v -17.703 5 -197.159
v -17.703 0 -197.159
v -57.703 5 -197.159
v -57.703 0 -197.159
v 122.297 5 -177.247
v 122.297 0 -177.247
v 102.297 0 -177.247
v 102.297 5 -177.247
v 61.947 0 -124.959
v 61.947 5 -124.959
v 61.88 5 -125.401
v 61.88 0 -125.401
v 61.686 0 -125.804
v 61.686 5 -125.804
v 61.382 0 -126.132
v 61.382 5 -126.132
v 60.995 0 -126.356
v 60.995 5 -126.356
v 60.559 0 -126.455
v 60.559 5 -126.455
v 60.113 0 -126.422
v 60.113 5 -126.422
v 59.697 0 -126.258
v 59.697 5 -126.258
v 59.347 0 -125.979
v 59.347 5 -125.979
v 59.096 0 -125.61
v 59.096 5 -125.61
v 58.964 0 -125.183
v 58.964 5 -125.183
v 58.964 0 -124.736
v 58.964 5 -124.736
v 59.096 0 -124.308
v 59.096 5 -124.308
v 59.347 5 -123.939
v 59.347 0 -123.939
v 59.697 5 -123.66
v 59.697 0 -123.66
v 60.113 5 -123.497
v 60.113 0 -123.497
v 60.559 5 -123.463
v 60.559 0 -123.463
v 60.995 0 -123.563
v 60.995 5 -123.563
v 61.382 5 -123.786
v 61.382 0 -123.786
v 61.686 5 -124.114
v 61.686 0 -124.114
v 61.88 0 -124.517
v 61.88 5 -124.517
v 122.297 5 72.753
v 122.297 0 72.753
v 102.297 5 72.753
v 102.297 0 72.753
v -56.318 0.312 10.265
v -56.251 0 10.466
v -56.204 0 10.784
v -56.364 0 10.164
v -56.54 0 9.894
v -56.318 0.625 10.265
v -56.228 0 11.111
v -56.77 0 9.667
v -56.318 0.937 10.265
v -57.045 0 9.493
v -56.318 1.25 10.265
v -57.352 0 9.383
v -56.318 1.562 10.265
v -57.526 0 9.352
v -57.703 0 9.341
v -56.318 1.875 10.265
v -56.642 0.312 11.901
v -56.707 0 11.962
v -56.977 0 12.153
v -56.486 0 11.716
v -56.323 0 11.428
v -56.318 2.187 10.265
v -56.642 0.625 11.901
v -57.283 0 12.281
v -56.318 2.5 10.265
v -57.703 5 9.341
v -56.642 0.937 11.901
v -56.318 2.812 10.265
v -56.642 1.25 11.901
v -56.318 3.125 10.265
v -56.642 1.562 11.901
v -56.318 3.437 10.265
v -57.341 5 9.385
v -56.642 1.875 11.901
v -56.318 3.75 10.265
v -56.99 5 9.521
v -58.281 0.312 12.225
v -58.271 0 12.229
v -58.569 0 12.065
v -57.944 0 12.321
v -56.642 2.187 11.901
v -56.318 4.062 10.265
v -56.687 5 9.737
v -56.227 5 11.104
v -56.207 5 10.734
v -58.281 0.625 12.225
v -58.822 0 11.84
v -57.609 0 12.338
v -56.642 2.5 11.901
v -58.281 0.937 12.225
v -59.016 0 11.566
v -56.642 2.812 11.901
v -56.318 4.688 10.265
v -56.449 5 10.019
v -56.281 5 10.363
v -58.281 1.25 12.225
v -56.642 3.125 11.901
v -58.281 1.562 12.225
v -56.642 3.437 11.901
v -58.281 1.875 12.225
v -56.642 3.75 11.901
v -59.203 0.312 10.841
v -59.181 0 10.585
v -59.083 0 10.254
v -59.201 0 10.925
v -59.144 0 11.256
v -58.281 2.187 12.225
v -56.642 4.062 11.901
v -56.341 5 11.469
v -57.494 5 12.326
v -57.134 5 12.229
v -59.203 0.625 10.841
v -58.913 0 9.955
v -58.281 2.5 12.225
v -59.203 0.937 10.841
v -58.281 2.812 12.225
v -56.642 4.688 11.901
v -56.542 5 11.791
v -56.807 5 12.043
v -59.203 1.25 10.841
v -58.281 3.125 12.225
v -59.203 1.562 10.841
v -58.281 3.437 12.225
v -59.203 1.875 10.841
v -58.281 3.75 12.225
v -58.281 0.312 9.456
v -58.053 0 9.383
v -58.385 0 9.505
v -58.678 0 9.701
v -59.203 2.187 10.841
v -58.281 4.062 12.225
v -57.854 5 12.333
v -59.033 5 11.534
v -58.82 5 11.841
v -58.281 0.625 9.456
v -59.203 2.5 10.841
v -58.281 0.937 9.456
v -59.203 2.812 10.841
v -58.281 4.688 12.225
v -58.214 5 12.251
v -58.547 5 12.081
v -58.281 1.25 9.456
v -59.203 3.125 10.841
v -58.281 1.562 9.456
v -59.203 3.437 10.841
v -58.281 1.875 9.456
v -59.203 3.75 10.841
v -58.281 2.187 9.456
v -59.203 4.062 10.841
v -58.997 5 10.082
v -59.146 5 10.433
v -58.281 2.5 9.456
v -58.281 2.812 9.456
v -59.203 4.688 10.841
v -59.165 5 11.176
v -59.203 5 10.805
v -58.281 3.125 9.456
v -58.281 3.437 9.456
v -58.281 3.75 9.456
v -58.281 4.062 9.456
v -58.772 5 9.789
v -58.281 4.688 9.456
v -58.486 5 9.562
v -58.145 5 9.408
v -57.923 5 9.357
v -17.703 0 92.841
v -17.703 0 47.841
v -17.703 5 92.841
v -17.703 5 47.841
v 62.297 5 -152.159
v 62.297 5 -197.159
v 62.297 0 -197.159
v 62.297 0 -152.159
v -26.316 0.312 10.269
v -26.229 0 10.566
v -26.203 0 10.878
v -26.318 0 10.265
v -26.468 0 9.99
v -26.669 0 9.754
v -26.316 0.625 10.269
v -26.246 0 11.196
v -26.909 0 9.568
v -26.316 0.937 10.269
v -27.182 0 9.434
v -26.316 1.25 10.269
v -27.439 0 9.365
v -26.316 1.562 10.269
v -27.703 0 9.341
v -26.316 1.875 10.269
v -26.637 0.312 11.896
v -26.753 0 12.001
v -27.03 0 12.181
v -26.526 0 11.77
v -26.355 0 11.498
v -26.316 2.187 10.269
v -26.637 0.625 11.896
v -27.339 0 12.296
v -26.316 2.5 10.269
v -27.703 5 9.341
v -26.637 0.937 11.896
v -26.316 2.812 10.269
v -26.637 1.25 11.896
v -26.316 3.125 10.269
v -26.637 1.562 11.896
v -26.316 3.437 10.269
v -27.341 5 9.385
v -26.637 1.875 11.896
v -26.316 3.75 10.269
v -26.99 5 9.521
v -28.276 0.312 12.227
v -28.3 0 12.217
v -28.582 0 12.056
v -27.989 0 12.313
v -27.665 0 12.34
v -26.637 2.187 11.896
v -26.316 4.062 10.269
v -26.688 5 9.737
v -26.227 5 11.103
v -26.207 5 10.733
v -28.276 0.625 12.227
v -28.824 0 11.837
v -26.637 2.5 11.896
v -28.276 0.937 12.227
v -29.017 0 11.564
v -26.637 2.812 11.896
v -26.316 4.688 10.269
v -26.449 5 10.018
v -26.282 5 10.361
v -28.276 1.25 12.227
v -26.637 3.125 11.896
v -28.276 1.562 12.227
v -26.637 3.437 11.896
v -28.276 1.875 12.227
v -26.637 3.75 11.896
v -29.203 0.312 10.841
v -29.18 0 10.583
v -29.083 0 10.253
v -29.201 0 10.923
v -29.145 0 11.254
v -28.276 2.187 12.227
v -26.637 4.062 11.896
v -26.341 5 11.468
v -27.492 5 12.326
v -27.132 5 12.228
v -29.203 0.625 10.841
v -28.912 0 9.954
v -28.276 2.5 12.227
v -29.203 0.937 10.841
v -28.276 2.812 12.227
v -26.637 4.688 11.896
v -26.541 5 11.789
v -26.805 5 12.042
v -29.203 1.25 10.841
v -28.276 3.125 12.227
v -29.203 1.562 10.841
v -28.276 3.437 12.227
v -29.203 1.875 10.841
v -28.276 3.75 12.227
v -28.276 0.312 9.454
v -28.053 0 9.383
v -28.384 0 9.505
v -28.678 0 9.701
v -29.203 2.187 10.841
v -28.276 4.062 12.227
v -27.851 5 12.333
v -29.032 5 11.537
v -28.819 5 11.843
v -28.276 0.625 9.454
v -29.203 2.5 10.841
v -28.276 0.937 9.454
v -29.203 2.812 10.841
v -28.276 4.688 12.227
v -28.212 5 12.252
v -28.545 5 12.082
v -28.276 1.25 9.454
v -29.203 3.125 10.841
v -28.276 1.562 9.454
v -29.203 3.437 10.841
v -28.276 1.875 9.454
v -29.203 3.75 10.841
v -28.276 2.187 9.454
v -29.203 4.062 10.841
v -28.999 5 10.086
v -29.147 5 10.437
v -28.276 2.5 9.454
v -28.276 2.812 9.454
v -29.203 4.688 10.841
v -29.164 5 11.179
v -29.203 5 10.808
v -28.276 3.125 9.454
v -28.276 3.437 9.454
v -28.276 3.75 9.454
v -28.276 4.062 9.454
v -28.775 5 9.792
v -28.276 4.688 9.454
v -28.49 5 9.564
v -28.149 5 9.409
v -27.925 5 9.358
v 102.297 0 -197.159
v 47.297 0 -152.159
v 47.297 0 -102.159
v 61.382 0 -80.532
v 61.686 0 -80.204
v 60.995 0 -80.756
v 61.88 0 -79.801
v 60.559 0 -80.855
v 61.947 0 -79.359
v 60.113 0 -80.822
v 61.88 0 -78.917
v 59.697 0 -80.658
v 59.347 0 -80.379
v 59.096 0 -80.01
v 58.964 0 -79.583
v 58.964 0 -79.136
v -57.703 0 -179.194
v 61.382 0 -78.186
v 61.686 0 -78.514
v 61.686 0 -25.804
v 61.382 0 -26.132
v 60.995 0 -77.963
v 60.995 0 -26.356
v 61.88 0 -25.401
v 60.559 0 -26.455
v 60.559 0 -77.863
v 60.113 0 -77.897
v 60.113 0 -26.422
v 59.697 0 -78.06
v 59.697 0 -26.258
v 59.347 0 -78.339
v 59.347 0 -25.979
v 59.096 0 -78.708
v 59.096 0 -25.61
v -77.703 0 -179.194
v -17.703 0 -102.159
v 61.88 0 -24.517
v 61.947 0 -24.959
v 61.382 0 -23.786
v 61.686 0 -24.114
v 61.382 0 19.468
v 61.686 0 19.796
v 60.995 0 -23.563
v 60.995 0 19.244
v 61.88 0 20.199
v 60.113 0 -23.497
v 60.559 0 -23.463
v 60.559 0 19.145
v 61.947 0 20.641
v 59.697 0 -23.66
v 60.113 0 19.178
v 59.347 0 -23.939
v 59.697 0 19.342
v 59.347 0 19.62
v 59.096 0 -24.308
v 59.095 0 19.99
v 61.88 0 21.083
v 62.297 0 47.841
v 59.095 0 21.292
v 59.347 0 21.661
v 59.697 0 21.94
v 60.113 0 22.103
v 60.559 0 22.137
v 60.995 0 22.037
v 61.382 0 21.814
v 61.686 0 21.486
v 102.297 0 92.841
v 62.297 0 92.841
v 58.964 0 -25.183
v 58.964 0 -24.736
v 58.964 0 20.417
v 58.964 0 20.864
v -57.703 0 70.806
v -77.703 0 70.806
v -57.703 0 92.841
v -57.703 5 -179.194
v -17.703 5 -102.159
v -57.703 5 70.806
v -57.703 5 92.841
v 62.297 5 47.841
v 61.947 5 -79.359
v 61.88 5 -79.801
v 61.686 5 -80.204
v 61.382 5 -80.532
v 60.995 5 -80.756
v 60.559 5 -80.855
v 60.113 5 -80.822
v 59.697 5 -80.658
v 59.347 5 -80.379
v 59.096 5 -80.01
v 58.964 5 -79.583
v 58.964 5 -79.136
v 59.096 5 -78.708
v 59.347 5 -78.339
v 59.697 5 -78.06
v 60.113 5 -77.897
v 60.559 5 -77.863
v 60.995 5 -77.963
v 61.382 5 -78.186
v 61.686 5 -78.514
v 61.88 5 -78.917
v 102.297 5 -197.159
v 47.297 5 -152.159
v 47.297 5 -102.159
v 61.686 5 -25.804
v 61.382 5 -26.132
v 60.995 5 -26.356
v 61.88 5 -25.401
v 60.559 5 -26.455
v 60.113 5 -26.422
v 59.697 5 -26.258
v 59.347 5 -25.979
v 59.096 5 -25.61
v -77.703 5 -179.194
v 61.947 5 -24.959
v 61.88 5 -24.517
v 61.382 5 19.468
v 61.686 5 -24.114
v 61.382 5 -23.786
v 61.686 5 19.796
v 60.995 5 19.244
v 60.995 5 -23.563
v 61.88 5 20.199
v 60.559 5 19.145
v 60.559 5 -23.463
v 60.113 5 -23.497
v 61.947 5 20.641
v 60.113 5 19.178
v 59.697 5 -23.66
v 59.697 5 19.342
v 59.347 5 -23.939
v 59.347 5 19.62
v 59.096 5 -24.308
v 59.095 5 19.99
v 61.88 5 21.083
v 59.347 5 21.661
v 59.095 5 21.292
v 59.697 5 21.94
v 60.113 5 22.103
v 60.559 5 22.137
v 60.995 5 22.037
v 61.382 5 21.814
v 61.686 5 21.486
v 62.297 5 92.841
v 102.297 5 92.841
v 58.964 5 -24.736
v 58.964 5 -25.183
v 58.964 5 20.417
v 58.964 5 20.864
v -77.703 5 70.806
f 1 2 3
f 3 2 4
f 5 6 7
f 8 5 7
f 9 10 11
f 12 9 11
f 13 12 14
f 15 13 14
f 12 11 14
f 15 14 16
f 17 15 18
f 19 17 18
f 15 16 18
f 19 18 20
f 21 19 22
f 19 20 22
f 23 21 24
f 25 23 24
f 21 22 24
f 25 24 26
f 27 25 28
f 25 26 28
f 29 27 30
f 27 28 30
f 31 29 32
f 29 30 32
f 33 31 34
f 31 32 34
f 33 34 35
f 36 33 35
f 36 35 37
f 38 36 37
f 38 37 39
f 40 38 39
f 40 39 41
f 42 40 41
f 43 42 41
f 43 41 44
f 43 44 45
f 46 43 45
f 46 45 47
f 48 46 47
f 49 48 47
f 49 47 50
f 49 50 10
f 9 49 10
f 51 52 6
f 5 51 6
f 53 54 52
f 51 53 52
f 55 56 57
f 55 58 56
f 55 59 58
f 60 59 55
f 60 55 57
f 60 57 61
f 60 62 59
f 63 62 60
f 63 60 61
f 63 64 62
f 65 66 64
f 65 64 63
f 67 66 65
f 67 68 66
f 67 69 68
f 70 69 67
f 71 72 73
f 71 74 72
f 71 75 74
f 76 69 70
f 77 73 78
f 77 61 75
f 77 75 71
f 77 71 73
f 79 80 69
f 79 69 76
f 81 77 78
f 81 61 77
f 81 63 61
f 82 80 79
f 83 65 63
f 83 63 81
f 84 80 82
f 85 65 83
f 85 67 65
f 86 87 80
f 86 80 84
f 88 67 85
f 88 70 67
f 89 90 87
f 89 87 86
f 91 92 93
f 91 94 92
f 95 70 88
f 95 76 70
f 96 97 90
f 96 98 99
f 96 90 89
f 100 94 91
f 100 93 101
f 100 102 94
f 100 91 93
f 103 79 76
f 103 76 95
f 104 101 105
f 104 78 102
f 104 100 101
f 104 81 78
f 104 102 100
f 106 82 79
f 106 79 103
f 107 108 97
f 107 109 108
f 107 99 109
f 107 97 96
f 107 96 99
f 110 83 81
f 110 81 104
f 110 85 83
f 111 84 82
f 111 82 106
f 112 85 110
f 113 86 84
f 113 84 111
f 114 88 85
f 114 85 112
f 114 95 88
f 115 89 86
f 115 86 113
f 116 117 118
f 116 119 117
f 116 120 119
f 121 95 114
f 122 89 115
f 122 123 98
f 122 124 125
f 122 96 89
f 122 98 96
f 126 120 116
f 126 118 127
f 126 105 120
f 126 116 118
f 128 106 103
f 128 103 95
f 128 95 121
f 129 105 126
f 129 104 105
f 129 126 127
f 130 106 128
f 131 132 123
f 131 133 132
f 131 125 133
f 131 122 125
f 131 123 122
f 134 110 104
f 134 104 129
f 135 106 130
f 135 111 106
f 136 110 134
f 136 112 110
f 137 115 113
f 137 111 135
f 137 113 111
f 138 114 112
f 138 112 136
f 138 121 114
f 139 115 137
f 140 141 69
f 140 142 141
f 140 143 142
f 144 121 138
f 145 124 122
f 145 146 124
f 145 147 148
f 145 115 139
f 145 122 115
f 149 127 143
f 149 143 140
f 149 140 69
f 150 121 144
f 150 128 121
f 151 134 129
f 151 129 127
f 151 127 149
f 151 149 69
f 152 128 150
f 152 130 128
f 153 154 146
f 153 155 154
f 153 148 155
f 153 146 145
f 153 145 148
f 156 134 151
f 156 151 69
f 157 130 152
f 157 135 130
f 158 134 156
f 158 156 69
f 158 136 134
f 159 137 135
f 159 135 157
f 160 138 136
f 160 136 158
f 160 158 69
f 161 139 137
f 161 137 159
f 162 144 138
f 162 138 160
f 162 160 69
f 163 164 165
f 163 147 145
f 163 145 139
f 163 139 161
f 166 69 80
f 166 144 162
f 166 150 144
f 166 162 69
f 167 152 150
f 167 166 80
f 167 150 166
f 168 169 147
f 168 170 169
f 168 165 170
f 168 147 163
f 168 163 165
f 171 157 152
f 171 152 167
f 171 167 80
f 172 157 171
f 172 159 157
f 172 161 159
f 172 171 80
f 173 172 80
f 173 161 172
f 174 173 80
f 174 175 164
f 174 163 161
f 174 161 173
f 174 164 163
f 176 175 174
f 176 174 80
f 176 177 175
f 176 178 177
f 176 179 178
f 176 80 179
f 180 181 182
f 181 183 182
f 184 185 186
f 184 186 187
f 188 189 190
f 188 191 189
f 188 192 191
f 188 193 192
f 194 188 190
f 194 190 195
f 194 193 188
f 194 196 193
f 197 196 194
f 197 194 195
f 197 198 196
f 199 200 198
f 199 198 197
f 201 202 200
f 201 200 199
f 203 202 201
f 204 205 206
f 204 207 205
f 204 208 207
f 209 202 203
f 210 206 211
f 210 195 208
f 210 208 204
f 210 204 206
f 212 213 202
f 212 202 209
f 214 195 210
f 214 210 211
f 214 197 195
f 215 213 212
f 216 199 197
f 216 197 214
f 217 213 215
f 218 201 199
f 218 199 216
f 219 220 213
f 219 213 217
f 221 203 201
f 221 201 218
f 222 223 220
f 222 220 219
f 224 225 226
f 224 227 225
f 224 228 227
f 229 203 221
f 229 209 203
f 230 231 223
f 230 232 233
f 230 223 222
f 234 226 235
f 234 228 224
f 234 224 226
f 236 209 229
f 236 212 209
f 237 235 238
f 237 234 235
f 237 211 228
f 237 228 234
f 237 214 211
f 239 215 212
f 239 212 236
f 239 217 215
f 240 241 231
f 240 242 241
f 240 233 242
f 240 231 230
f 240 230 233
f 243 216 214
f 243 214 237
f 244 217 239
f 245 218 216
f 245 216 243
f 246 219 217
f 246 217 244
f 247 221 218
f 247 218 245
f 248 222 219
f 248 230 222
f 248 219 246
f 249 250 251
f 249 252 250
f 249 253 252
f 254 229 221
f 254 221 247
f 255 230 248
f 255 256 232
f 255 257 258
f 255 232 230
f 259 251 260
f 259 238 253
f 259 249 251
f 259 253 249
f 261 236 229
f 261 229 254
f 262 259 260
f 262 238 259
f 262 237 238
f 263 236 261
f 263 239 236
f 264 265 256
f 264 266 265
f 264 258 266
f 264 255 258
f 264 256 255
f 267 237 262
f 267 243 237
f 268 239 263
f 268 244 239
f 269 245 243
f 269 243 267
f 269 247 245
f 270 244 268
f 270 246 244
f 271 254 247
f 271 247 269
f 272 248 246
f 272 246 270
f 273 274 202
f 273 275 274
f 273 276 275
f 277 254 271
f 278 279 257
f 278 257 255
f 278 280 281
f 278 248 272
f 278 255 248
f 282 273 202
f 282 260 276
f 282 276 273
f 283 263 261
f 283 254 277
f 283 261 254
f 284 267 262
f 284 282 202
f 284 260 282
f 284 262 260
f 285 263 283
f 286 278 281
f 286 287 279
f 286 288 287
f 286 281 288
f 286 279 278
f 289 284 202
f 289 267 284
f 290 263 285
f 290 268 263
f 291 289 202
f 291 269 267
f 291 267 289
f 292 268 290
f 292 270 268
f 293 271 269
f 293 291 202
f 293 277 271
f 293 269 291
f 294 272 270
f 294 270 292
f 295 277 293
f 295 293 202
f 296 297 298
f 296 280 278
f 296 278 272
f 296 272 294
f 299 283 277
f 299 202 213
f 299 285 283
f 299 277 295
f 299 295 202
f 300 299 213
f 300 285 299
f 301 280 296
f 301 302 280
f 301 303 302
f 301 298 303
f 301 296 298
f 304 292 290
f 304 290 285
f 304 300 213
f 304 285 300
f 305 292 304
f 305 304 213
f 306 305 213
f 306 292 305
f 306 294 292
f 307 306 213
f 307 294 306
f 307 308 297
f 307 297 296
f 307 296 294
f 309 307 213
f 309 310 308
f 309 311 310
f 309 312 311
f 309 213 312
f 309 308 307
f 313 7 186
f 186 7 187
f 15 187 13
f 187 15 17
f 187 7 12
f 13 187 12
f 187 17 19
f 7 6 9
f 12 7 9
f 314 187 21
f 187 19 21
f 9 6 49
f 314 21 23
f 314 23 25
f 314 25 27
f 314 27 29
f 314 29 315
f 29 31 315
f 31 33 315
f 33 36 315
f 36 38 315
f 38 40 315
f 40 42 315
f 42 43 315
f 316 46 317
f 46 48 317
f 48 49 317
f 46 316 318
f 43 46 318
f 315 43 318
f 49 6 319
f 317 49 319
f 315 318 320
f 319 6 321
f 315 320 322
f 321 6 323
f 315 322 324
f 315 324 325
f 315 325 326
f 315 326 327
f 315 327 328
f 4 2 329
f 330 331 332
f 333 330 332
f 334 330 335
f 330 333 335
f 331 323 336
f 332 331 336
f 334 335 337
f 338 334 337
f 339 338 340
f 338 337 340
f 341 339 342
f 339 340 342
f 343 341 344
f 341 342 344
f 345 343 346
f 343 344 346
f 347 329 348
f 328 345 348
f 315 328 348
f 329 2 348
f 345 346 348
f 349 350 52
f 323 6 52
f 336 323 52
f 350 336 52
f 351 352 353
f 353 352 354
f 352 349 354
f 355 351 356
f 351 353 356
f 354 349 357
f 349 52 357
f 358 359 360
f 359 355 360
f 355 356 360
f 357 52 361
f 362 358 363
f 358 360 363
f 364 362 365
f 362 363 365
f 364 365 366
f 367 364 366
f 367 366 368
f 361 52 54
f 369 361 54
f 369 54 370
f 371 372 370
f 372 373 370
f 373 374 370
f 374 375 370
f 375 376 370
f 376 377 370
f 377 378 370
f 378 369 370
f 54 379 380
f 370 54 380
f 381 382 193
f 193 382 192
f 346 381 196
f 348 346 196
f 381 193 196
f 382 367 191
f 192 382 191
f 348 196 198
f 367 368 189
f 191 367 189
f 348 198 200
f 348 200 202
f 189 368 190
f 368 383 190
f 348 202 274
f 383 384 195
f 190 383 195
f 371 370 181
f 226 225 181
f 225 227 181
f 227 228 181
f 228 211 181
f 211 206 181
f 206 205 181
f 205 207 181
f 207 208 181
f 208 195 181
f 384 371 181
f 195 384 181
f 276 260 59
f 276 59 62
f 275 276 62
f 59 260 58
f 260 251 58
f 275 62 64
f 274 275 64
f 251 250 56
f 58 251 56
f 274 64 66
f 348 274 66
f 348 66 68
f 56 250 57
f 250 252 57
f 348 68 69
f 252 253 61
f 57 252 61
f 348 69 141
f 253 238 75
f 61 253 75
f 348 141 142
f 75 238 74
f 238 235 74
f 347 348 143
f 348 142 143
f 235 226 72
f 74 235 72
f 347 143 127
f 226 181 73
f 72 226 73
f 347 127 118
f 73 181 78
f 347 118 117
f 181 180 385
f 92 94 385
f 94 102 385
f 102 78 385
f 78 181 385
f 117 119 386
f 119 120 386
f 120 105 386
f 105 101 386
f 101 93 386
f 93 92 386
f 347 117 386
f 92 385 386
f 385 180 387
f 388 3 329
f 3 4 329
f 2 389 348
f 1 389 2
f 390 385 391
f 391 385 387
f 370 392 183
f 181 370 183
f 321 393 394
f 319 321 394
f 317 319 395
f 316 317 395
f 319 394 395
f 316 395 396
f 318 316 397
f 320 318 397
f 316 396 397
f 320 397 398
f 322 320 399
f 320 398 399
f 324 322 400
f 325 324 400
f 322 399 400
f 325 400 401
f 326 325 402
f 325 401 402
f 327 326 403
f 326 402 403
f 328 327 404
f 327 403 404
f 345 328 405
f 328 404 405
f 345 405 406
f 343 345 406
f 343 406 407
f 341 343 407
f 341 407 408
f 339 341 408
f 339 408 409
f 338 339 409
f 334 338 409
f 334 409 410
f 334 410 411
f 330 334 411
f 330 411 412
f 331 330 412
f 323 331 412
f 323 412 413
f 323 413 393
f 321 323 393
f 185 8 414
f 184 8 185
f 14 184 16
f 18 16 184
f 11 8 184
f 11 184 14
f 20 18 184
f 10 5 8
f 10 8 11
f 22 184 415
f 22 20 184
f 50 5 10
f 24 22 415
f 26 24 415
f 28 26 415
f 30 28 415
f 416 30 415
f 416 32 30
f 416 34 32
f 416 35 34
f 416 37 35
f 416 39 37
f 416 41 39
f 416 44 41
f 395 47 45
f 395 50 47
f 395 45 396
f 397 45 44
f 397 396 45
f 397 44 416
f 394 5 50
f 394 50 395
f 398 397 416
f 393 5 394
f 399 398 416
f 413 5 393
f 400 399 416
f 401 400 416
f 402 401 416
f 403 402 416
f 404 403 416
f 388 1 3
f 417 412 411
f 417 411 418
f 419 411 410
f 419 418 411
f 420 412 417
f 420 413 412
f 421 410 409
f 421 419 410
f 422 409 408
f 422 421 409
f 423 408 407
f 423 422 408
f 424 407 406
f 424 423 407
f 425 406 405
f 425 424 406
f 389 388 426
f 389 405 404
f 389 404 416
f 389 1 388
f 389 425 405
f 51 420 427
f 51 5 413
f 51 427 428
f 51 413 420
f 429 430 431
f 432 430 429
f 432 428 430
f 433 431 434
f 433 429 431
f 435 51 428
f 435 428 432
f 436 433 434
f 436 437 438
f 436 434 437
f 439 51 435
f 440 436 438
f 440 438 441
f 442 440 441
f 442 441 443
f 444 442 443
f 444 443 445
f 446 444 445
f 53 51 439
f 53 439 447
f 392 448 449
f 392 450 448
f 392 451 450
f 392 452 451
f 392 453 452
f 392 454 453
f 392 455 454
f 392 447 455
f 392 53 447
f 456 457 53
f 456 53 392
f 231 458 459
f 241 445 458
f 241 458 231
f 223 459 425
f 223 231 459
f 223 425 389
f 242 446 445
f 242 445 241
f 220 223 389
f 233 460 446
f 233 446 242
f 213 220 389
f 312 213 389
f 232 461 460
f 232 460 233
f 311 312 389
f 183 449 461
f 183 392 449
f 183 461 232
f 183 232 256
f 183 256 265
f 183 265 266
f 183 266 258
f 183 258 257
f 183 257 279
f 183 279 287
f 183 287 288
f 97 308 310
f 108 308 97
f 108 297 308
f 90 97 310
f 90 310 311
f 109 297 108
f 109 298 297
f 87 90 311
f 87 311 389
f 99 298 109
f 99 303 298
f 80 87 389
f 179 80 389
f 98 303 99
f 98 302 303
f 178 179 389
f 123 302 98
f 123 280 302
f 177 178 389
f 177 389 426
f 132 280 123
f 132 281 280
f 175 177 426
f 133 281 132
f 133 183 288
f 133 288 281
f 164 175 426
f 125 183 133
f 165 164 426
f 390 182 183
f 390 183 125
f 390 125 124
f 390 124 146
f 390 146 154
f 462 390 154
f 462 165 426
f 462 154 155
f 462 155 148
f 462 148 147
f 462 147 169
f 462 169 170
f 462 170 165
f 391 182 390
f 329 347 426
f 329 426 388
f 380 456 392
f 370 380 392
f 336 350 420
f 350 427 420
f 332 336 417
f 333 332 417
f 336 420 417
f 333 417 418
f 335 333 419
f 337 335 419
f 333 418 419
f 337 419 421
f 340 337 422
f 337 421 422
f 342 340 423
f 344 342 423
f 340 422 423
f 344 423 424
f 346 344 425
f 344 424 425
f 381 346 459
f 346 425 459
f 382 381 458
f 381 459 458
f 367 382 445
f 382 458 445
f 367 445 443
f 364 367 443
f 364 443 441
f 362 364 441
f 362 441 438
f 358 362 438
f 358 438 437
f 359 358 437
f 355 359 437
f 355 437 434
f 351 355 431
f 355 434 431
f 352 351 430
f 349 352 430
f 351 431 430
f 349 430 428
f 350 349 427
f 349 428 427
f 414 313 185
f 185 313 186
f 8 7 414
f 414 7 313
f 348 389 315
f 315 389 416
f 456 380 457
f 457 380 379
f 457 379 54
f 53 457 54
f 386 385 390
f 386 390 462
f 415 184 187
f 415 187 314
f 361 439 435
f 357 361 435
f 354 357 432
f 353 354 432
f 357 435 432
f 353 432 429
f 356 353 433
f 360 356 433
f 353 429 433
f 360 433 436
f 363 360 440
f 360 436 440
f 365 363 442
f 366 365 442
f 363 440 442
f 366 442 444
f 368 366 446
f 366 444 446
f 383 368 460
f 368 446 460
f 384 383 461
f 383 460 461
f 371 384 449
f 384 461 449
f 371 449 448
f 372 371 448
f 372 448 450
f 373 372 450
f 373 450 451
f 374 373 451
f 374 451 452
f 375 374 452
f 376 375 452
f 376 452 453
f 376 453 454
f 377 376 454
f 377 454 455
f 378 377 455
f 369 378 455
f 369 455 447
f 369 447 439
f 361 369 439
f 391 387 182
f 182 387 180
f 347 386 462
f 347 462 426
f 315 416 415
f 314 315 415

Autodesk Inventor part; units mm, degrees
ref_plane "YZ Plane" through (0, 0, 0) normal (1, 0, 0) x (0, 1, 0)
ref_plane "XZ Plane" through (0, 0, 0) normal (0, 1, 0) x (-1, 0, 0)
ref_plane "XY Plane" through (0, 0, 0) normal (0, 0, 1) x (1, 0, 0)
sketch "Esquisse1" plane through (0, 0, 0) normal (0, 1, 0) x (-1, 0, 0)
  line L0 (57.703, 92.8408) -> (-102.297, 92.8408)
  line L1 (-102.297, -197.1592) -> (57.703, -197.1592)
  line L2 (-102.297, 72.7532) -> (-122.297, 72.7532)
  line L3 (-122.297, 72.7532) -> (-122.297, -177.2468)
  line L4 (-122.297, -177.2468) -> (-102.297, -177.2468)
  line L5 (-102.297, 70.8056) -> (-102.297, 72.7532)
  line L6 (57.703, 70.8056) -> (77.703, 70.8056)
  line L7 (77.703, 70.8056) -> (77.703, -179.1944)
  line L8 (77.703, -179.1944) -> (57.703, -179.1944)
  line L9 (57.703, -179.1944) -> (57.703, -177.2468)
  line L10 (57.703, -197.1592) -> (57.703, -179.1944)
  line L11 (57.703, 70.8056) -> (57.703, 92.8408)
  line L12 (-102.297, 92.8408) -> (-102.297, 72.7532)
  line L13 (-102.297, -177.2468) -> (-102.297, -197.1592)
  point P0 (0, 0)
  dimension "d0" = 290
  dimension "d1" = 160
  dimension "d17" = 20
  dimension "d18" = 250
  dimension "d19" = 20
  dimension "d20" = 250
extrude "Extrusion1" add sketch "Esquisse1" along normal blind 5
ref_plane "Plan de construction1" through (22.297, 0, -197.1592) normal (-1, 0, 0) x (0, 0, 1)
sketch "Sketch2" plane through (0, 5, 0) normal (0, 1, 0) x (1, 0, 0)
  circle A0 centre (60.447, -20.6408) radius 1.5001 projected
  circle A1 centre (60.447, 24.9592) radius 1.5 projected
  circle A2 centre (60.447, 124.9592) radius 1.5 projected
  circle A3 centre (60.447, 79.3592) radius 1.5 projected
  point P0 (0, 0)
extrude "Extrusion2" cut sketch "Sketch2" against normal through all
sketch "Sketch5" plane through (0, 5, 0) normal (0, 1, 0) x (1, 0, 0)
  line L0 (-17.703, -92.8408) -> (62.297, -92.8408)
  line L1 (62.297, -92.8408) -> (62.297, -47.8408)
  line L2 (62.297, -47.8408) -> (-17.703, -47.8408)
  line L3 (-17.703, -47.8408) -> (-17.703, -92.8408)
  line L4 (-57.703, -92.8408) -> (102.297, -92.8408) projected
  line L5 (-57.703, 197.1592) -> (-57.703, -92.8408) projected
  line L6 (102.297, -92.8408) -> (102.297, 197.1592) projected
  line L7 (102.297, 197.1592) -> (-57.703, 197.1592) projected
  line L8 (-17.703, 197.1592) -> (62.297, 197.1592)
  line L9 (62.297, 197.1592) -> (62.297, 152.1592)
  line L10 (62.297, 152.1592) -> (-17.703, 152.1592)
  line L11 (-17.703, 152.1592) -> (-17.703, 197.1592)
  line L12 (47.297, 152.1592) -> (-17.703, 152.1592)
  line L13 (-17.703, 152.1592) -> (-17.703, 102.1592)
  line L14 (-17.703, 102.1592) -> (47.297, 102.1592)
  line L15 (47.297, 102.1592) -> (47.297, 152.1592)
  point P0 (0, 0)
  dimension "d6" = 0
  dimension "d7" = 45
  dimension "d8" = 40
  dimension "d9" = 40
  dimension "d10" = 40
  dimension "d11" = 40
  dimension "d12" = 45
  dimension "d15" = 65
  dimension "d16" = 50
extrude "Extrusion3" cut sketch "Sketch5" against normal through all contours L3 L2 L1 L0 | L7 L9 L10 L11 | L10 L15 L14 L13
sketch "Sketch6" plane through (0, 5, 0) normal (0, 1, 0) x (1, 0, 0)
  spline S0 degree 3 poles (-57.703, -9.3408) (-57.5164, -9.3408) (-57.3163, -9.3777) (-56.9466, -9.5301) (-56.7768, -9.6456) (-56.51, -9.9124) (-56.3945, -10.0805) (-56.241, -10.4501) (-56.203, -10.6516) (-56.203, -11.03) (-56.241, -11.2314) (-56.3945, -11.601) (-56.51, -11.7692) (-56.7768, -12.0359) (-56.9466, -12.1514) (-57.3163, -12.3038) (-57.5164, -12.3408) (-57.8926, -12.3408) (-58.0946, -12.3027) (-58.4667, -12.1475) (-58.6367, -12.0303) (-58.9007, -11.7625) (-59.0142, -11.5958) (-59.1654, -11.2291) (-59.203, -11.029) (-59.203, -10.6526) (-59.1654, -10.4525) (-59.0142, -10.0858) (-58.9007, -9.9191) (-58.6367, -9.6513) (-58.4667, -9.5341) (-58.0946, -9.3788) (-57.8926, -9.3408) (-57.703, -9.3408) knots 0 0 0 0 0.057709 0.057709 0.115418 0.115418 0.172176 0.172176 0.228935 0.228935 0.285694 0.285694 0.342453 0.342453 0.400161 0.400161 0.45787 0.45787 0.516493 0.516493 0.575116 0.575116 0.631571 0.631571 0.688026 0.688026 0.744481 0.744481 0.800936 0.800936 0.859558 0.859558 0.918181 0.918181 0.918181 0.918181 projected
  spline S1 degree 3 poles (-27.703, -9.3408) (-27.5152, -9.3408) (-27.314, -9.3782) (-26.9424, -9.5324) (-26.772, -9.6492) (-26.5065, -9.9173) (-26.3923, -10.0847) (-26.2405, -10.4525) (-26.203, -10.6528) (-26.203, -11.0288) (-26.2405, -11.229) (-26.3923, -11.5968) (-26.5065, -11.7643) (-26.772, -12.0324) (-26.9424, -12.1492) (-27.314, -12.3034) (-27.5152, -12.3408) (-27.8908, -12.3408) (-28.0911, -12.3034) (-28.4604, -12.1508) (-28.6295, -12.0356) (-28.8953, -11.7698) (-29.0108, -11.6022) (-29.1647, -11.2327) (-29.203, -11.0308) (-29.203, -10.6508) (-29.1647, -10.4489) (-29.0108, -10.0794) (-28.8953, -9.9118) (-28.6295, -9.646) (-28.4604, -9.5307) (-28.0911, -9.3781) (-27.8908, -9.3408) (-27.703, -9.3408) knots 0 0 0 0 0.058071 0.058071 0.116142 0.116142 0.172538 0.172538 0.228935 0.228935 0.285331 0.285331 0.341727 0.341727 0.399798 0.399798 0.457869 0.457869 0.515944 0.515944 0.574019 0.574019 0.631023 0.631023 0.688027 0.688027 0.74503 0.74503 0.802034 0.802034 0.860109 0.860109 0.918184 0.918184 0.918184 0.918184 projected
  point P0 (0, 0)
  point P1 (-57.703, -9.3408)
  point P2 (-27.703, -9.3408)
extrude "Extrusion4" cut sketch "Sketch6" against normal through all
properties part number "etage-bras"
